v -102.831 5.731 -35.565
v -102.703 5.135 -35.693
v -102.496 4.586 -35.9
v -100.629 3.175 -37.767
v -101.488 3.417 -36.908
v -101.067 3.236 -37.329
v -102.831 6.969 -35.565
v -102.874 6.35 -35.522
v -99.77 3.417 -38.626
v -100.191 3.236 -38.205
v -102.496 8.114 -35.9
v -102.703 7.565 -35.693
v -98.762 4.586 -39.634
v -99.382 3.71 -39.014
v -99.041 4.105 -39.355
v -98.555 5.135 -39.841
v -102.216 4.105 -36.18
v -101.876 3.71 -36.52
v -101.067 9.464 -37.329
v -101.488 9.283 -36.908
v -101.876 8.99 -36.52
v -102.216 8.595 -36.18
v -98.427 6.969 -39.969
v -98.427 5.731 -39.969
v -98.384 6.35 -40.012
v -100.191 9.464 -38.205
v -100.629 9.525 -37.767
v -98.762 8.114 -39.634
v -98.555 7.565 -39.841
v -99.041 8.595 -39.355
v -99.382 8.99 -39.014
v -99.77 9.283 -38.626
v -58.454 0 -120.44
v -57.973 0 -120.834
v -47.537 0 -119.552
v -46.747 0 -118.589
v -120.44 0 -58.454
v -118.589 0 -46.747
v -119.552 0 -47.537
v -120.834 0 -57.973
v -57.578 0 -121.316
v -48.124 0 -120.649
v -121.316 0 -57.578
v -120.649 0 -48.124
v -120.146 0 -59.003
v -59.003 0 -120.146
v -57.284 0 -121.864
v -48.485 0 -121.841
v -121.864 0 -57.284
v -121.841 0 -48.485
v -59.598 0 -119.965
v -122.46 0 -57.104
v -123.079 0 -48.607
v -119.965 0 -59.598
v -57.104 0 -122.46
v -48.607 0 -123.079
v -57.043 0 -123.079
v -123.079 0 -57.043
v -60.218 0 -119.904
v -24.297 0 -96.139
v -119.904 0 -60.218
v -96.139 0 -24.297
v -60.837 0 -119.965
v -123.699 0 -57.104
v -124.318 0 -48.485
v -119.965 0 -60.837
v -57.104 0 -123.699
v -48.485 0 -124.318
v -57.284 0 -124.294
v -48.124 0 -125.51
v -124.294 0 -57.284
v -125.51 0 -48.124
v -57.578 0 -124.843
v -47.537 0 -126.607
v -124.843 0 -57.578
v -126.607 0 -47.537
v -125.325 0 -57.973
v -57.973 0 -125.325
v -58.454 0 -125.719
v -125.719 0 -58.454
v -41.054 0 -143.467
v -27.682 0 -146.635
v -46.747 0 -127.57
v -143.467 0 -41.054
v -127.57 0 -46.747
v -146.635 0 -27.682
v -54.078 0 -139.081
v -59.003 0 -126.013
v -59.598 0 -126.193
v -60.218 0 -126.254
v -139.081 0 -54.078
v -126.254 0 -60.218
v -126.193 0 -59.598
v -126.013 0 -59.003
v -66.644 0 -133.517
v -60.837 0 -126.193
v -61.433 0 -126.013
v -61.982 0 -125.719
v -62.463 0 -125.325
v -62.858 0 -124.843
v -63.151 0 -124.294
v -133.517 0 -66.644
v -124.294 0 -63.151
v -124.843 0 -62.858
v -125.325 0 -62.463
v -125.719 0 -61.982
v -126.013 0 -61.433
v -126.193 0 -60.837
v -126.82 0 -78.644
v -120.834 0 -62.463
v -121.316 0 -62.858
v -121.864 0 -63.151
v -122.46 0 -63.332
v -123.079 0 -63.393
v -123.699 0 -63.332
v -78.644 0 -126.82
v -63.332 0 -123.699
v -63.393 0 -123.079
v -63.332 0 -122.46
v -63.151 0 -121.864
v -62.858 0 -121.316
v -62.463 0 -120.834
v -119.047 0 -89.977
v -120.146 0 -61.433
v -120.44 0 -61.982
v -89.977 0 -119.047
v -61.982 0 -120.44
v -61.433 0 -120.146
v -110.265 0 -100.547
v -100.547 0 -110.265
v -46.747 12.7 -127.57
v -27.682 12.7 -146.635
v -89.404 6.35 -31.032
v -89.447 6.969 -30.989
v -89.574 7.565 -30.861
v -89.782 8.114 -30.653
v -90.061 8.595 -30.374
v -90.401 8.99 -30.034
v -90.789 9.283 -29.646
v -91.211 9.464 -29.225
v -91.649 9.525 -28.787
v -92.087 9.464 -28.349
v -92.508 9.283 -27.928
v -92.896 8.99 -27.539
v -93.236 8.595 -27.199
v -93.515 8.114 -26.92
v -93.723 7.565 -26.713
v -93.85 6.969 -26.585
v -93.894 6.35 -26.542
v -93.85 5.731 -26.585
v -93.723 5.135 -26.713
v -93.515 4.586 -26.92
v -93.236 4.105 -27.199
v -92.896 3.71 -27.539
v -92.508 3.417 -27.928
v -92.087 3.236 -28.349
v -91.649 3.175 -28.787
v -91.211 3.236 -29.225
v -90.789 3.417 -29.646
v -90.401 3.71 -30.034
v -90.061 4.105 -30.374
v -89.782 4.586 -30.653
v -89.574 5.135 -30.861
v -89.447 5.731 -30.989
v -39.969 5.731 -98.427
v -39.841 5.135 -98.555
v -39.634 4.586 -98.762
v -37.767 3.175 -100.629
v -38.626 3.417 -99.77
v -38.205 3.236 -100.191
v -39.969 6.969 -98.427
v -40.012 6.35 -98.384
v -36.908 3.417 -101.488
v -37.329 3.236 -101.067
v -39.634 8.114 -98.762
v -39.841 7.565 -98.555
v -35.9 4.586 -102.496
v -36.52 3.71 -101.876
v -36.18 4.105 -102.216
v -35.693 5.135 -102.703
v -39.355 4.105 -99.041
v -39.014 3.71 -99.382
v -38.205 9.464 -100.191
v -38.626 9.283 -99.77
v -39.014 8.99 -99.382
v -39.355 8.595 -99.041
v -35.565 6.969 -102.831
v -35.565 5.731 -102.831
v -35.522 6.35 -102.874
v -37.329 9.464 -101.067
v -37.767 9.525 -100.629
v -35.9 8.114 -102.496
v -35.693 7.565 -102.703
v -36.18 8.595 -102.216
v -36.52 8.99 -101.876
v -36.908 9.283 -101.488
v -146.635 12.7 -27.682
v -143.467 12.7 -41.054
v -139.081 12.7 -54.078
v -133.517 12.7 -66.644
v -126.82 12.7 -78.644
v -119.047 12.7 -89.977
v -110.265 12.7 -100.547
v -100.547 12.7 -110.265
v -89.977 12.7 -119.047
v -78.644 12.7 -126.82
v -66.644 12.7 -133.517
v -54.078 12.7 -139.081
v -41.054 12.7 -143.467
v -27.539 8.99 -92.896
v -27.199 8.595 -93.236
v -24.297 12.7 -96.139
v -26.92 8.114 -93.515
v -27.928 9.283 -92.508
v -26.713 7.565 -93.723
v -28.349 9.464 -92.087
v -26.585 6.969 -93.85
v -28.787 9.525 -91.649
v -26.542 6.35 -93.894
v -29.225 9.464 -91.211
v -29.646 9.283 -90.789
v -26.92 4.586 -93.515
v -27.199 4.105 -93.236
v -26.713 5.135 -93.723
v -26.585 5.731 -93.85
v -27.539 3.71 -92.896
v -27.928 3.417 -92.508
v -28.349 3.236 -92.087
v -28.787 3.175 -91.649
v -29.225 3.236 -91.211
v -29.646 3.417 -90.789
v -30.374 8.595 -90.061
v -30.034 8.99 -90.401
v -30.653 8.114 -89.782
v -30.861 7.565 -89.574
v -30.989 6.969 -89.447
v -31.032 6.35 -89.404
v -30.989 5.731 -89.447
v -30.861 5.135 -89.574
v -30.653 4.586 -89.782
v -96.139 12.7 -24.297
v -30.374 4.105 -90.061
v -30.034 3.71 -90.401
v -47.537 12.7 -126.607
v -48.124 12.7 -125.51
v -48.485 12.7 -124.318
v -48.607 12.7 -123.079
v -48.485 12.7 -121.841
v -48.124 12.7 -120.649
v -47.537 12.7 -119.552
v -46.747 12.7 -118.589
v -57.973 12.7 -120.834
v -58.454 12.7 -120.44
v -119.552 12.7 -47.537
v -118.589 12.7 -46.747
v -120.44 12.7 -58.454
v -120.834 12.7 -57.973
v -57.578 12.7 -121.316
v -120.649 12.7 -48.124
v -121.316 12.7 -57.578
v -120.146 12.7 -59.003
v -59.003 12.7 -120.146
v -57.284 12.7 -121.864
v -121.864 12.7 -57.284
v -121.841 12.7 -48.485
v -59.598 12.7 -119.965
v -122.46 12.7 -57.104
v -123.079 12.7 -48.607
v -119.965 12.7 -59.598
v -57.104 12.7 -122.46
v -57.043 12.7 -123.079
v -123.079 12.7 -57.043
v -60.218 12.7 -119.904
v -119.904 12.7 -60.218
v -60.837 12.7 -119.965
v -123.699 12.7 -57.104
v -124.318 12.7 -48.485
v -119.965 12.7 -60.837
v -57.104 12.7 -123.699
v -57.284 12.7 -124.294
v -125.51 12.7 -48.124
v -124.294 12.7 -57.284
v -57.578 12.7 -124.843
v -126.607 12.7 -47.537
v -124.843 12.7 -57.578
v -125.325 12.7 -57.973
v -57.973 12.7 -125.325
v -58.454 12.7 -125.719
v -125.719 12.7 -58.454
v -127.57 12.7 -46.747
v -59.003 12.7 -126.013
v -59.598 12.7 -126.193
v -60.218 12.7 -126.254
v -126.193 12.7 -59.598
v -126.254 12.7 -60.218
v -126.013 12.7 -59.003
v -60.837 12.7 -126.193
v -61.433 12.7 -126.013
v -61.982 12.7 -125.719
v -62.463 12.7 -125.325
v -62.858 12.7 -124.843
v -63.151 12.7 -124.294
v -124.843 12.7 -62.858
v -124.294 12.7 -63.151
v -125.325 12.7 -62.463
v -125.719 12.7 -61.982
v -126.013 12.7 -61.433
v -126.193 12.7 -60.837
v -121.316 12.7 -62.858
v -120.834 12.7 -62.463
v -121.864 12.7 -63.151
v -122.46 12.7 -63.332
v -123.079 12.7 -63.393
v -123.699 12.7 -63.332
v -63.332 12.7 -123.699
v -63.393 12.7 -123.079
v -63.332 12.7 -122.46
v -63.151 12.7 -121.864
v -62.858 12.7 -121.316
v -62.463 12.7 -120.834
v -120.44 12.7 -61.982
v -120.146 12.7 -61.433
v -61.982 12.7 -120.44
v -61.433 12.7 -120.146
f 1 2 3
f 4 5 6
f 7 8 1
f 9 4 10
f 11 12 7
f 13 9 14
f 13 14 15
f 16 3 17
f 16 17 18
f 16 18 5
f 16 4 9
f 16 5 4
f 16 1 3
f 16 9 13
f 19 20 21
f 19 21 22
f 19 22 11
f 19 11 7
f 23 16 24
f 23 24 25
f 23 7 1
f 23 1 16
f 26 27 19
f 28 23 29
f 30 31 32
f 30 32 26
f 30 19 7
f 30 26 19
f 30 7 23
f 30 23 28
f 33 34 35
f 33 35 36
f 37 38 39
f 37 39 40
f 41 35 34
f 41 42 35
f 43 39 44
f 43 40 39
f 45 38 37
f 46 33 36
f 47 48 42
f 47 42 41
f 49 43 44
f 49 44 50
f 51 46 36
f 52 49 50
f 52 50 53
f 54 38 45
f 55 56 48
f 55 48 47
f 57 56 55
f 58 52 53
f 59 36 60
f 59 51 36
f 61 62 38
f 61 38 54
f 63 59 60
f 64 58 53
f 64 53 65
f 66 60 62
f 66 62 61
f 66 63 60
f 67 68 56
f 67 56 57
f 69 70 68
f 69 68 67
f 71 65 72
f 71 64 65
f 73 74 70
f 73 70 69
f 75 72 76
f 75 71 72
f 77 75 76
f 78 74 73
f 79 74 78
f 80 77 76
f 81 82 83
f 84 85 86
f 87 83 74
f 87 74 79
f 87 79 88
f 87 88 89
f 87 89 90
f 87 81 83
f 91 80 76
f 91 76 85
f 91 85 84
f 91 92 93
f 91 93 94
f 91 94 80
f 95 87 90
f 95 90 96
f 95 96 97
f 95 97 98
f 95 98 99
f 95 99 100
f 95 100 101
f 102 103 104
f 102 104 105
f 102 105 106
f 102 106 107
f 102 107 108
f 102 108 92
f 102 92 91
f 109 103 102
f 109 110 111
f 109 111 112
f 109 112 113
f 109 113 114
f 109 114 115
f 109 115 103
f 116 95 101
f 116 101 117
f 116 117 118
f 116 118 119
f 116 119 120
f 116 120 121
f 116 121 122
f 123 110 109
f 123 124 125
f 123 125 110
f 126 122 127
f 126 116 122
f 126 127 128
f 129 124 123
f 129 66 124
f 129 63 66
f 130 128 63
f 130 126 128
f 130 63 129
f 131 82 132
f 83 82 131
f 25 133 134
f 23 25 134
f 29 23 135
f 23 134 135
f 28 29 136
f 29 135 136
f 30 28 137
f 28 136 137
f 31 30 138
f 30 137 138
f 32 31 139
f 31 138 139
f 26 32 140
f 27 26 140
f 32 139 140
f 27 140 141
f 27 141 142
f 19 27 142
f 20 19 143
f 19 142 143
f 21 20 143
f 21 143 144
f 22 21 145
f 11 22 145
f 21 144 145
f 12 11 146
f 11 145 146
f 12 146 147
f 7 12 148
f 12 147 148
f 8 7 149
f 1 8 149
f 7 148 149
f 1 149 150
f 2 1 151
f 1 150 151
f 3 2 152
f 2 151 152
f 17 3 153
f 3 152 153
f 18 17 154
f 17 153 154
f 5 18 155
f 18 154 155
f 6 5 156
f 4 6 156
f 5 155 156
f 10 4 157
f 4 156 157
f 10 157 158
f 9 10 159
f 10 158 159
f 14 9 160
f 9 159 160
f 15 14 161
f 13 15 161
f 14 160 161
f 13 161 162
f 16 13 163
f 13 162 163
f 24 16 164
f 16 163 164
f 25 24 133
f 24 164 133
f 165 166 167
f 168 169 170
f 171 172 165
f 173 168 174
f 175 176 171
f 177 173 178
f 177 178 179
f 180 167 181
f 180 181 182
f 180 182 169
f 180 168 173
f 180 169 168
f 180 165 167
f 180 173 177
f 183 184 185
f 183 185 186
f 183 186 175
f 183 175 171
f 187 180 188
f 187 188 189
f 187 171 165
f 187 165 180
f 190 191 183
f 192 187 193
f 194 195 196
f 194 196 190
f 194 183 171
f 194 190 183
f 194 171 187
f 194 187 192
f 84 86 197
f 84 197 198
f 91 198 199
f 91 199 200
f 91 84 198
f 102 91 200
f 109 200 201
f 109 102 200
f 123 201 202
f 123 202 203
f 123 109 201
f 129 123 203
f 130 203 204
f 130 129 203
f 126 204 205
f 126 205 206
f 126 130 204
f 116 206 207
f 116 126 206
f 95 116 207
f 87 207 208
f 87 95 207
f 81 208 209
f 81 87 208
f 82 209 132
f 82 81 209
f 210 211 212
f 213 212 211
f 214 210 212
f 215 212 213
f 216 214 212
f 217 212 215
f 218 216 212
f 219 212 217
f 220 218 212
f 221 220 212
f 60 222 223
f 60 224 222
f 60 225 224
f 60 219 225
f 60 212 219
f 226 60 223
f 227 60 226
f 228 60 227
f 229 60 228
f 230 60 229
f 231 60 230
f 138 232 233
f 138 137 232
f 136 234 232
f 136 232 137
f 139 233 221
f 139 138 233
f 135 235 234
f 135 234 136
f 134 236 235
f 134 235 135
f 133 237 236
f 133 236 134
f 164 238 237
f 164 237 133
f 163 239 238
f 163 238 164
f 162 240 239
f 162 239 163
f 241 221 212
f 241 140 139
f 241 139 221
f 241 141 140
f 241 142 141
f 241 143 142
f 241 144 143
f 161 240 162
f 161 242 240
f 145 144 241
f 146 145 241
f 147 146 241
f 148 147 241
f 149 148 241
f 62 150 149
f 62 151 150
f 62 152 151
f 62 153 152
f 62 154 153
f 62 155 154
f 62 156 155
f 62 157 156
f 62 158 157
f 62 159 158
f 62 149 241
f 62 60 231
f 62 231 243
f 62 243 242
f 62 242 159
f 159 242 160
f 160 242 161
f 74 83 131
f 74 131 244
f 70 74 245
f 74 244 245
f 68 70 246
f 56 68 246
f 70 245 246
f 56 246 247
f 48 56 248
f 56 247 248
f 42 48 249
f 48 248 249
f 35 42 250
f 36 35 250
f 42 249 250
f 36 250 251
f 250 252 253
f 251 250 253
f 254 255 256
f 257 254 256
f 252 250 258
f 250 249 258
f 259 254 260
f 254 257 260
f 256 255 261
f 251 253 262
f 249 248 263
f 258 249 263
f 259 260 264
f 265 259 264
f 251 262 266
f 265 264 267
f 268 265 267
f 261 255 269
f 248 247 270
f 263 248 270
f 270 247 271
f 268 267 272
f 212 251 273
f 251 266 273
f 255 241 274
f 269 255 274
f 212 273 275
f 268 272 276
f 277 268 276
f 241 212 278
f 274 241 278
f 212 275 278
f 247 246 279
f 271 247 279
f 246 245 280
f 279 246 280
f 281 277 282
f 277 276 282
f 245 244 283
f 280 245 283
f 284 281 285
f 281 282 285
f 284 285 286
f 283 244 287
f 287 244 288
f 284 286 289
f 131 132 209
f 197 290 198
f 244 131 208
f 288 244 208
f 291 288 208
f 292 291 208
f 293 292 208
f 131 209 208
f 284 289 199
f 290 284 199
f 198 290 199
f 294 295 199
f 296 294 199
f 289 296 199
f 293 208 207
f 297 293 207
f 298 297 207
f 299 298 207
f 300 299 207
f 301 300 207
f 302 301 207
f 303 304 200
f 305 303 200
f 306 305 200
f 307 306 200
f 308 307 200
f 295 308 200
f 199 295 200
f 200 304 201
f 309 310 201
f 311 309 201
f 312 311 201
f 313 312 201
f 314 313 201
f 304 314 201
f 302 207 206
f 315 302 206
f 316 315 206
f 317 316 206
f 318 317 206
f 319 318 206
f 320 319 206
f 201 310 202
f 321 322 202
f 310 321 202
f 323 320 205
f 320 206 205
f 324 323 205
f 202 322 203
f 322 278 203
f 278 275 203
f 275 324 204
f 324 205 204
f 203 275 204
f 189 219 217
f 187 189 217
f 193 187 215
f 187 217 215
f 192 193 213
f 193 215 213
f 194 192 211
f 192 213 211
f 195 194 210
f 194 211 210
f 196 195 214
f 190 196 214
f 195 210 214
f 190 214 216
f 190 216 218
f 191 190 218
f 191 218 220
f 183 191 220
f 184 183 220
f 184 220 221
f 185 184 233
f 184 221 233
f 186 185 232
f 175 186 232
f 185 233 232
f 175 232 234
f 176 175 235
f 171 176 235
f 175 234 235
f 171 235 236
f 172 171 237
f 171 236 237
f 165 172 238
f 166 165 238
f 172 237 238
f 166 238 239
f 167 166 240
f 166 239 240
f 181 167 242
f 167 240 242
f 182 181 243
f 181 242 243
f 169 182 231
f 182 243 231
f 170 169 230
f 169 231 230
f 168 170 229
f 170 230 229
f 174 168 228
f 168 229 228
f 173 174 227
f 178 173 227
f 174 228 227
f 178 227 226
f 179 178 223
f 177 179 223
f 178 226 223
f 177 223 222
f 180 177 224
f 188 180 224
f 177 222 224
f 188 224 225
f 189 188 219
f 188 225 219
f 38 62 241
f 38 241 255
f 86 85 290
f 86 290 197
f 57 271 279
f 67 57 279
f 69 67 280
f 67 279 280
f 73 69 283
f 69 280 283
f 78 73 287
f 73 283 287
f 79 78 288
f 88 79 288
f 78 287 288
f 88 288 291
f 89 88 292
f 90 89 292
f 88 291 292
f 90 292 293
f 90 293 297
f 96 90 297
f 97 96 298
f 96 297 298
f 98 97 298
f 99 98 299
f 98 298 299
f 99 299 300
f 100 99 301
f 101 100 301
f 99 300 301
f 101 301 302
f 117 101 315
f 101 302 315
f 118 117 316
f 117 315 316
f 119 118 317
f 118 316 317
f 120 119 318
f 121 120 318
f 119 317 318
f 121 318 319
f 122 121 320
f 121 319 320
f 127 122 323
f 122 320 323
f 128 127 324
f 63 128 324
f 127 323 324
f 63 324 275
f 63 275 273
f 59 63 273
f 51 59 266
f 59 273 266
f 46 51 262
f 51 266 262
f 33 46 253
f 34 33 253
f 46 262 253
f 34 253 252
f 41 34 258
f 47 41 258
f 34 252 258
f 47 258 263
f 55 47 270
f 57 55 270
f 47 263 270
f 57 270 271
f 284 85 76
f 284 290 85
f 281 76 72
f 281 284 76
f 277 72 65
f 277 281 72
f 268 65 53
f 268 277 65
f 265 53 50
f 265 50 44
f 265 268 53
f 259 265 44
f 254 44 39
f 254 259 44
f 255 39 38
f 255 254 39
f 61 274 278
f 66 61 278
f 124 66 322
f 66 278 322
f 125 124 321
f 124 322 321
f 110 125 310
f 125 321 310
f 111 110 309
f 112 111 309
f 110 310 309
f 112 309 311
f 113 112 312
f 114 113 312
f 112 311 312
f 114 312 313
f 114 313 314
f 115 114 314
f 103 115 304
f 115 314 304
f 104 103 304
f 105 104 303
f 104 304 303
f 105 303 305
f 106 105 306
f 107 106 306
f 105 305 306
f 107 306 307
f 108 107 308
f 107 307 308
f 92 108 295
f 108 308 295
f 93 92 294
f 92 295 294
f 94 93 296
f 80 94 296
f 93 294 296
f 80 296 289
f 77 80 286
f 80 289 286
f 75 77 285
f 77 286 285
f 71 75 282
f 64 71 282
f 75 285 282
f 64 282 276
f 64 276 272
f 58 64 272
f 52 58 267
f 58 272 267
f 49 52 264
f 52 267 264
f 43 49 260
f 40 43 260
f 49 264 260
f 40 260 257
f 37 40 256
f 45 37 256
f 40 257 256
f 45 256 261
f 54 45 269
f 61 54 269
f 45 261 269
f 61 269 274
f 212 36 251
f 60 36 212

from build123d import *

# Parameters (mm, degrees)
CRADLE_DEPTH                                  = 12.7
SKETCH1_R                                     = 3.175
CUT_EXTRUDE1_DEPTH                            = 12.7
QUARTER_INCH_FILLETS_R                        = 6.35
SKETCH4_R                                     = 3.175
F_0_25_28_DIAMETER_TAPPED_HOLES_FOR_LID_DEPTH = 12.7


with BuildPart() as part:
    # Base → Cradle (new body)
    with BuildSketch(Plane(origin=(0, 0, 0), x_dir=(1, 0, 0), z_dir=(0, 1, 0))):
        with BuildLine():
            Line((-27.68192265, 146.634960986), (-51.237417334, 123.079466302))
            Line((-51.237417334, 123.079466302), (-24.296648971, 96.138697939))
            Line((-24.296648971, 96.138697939), (-96.138697939, 24.296648971))
            Line((-96.138697939, 24.296648971), (-123.079466302, 51.237417334))
            Line((-123.079466302, 51.237417334), (-146.634960986, 27.68192265))
            ThreePointArc((-146.634960986, 27.68192265), (-105.518009423, 105.518009423), (-27.68192265, 146.634960986))
        make_face()
    extrude(amount=CRADLE_DEPTH)

    # Sketch1 → Cut-Extrude1 (cut)
    with BuildSketch(Plane(origin=(0, 12.7, 0), x_dir=(1, 0, 0), z_dir=(0, 1, 0))):
        with Locations((-60.217673455, 123.079466302)):
            Circle(SKETCH1_R)
        with Locations((-123.079466302, 60.217673455)):
            Circle(SKETCH1_R)
    extrude(amount=-CUT_EXTRUDE1_DEPTH, mode=Mode.SUBTRACT)

    # Quarter Inch Fillets
    quarter_inch_fillets_edges = [part.edges().sort_by_distance(p)[0] for p in [
        (-123.079466302, 6.35, -51.237417334),
        (-51.237417334, 6.35, -123.079466302),
    ]]
    fillet(quarter_inch_fillets_edges, radius=QUARTER_INCH_FILLETS_R)

    # Sketch4 → 0.25"-28 Diameter Tapped Holes for Lid (cut)
    with BuildSketch(Plane(origin=(-60.217673455, 0, -60.217673455), x_dir=(0.707106781, 0, -0.707106781), z_dir=(0.707106781, 0, 0.707106781))):
        with Locations((44.45, 6.35)):
            Circle(SKETCH4_R)
        with Locations((-44.45, 6.35)):
            Circle(SKETCH4_R)
    extrude(amount=-F_0_25_28_DIAMETER_TAPPED_HOLES_FOR_LID_DEPTH, mode=Mode.SUBTRACT)


solid = part.part
